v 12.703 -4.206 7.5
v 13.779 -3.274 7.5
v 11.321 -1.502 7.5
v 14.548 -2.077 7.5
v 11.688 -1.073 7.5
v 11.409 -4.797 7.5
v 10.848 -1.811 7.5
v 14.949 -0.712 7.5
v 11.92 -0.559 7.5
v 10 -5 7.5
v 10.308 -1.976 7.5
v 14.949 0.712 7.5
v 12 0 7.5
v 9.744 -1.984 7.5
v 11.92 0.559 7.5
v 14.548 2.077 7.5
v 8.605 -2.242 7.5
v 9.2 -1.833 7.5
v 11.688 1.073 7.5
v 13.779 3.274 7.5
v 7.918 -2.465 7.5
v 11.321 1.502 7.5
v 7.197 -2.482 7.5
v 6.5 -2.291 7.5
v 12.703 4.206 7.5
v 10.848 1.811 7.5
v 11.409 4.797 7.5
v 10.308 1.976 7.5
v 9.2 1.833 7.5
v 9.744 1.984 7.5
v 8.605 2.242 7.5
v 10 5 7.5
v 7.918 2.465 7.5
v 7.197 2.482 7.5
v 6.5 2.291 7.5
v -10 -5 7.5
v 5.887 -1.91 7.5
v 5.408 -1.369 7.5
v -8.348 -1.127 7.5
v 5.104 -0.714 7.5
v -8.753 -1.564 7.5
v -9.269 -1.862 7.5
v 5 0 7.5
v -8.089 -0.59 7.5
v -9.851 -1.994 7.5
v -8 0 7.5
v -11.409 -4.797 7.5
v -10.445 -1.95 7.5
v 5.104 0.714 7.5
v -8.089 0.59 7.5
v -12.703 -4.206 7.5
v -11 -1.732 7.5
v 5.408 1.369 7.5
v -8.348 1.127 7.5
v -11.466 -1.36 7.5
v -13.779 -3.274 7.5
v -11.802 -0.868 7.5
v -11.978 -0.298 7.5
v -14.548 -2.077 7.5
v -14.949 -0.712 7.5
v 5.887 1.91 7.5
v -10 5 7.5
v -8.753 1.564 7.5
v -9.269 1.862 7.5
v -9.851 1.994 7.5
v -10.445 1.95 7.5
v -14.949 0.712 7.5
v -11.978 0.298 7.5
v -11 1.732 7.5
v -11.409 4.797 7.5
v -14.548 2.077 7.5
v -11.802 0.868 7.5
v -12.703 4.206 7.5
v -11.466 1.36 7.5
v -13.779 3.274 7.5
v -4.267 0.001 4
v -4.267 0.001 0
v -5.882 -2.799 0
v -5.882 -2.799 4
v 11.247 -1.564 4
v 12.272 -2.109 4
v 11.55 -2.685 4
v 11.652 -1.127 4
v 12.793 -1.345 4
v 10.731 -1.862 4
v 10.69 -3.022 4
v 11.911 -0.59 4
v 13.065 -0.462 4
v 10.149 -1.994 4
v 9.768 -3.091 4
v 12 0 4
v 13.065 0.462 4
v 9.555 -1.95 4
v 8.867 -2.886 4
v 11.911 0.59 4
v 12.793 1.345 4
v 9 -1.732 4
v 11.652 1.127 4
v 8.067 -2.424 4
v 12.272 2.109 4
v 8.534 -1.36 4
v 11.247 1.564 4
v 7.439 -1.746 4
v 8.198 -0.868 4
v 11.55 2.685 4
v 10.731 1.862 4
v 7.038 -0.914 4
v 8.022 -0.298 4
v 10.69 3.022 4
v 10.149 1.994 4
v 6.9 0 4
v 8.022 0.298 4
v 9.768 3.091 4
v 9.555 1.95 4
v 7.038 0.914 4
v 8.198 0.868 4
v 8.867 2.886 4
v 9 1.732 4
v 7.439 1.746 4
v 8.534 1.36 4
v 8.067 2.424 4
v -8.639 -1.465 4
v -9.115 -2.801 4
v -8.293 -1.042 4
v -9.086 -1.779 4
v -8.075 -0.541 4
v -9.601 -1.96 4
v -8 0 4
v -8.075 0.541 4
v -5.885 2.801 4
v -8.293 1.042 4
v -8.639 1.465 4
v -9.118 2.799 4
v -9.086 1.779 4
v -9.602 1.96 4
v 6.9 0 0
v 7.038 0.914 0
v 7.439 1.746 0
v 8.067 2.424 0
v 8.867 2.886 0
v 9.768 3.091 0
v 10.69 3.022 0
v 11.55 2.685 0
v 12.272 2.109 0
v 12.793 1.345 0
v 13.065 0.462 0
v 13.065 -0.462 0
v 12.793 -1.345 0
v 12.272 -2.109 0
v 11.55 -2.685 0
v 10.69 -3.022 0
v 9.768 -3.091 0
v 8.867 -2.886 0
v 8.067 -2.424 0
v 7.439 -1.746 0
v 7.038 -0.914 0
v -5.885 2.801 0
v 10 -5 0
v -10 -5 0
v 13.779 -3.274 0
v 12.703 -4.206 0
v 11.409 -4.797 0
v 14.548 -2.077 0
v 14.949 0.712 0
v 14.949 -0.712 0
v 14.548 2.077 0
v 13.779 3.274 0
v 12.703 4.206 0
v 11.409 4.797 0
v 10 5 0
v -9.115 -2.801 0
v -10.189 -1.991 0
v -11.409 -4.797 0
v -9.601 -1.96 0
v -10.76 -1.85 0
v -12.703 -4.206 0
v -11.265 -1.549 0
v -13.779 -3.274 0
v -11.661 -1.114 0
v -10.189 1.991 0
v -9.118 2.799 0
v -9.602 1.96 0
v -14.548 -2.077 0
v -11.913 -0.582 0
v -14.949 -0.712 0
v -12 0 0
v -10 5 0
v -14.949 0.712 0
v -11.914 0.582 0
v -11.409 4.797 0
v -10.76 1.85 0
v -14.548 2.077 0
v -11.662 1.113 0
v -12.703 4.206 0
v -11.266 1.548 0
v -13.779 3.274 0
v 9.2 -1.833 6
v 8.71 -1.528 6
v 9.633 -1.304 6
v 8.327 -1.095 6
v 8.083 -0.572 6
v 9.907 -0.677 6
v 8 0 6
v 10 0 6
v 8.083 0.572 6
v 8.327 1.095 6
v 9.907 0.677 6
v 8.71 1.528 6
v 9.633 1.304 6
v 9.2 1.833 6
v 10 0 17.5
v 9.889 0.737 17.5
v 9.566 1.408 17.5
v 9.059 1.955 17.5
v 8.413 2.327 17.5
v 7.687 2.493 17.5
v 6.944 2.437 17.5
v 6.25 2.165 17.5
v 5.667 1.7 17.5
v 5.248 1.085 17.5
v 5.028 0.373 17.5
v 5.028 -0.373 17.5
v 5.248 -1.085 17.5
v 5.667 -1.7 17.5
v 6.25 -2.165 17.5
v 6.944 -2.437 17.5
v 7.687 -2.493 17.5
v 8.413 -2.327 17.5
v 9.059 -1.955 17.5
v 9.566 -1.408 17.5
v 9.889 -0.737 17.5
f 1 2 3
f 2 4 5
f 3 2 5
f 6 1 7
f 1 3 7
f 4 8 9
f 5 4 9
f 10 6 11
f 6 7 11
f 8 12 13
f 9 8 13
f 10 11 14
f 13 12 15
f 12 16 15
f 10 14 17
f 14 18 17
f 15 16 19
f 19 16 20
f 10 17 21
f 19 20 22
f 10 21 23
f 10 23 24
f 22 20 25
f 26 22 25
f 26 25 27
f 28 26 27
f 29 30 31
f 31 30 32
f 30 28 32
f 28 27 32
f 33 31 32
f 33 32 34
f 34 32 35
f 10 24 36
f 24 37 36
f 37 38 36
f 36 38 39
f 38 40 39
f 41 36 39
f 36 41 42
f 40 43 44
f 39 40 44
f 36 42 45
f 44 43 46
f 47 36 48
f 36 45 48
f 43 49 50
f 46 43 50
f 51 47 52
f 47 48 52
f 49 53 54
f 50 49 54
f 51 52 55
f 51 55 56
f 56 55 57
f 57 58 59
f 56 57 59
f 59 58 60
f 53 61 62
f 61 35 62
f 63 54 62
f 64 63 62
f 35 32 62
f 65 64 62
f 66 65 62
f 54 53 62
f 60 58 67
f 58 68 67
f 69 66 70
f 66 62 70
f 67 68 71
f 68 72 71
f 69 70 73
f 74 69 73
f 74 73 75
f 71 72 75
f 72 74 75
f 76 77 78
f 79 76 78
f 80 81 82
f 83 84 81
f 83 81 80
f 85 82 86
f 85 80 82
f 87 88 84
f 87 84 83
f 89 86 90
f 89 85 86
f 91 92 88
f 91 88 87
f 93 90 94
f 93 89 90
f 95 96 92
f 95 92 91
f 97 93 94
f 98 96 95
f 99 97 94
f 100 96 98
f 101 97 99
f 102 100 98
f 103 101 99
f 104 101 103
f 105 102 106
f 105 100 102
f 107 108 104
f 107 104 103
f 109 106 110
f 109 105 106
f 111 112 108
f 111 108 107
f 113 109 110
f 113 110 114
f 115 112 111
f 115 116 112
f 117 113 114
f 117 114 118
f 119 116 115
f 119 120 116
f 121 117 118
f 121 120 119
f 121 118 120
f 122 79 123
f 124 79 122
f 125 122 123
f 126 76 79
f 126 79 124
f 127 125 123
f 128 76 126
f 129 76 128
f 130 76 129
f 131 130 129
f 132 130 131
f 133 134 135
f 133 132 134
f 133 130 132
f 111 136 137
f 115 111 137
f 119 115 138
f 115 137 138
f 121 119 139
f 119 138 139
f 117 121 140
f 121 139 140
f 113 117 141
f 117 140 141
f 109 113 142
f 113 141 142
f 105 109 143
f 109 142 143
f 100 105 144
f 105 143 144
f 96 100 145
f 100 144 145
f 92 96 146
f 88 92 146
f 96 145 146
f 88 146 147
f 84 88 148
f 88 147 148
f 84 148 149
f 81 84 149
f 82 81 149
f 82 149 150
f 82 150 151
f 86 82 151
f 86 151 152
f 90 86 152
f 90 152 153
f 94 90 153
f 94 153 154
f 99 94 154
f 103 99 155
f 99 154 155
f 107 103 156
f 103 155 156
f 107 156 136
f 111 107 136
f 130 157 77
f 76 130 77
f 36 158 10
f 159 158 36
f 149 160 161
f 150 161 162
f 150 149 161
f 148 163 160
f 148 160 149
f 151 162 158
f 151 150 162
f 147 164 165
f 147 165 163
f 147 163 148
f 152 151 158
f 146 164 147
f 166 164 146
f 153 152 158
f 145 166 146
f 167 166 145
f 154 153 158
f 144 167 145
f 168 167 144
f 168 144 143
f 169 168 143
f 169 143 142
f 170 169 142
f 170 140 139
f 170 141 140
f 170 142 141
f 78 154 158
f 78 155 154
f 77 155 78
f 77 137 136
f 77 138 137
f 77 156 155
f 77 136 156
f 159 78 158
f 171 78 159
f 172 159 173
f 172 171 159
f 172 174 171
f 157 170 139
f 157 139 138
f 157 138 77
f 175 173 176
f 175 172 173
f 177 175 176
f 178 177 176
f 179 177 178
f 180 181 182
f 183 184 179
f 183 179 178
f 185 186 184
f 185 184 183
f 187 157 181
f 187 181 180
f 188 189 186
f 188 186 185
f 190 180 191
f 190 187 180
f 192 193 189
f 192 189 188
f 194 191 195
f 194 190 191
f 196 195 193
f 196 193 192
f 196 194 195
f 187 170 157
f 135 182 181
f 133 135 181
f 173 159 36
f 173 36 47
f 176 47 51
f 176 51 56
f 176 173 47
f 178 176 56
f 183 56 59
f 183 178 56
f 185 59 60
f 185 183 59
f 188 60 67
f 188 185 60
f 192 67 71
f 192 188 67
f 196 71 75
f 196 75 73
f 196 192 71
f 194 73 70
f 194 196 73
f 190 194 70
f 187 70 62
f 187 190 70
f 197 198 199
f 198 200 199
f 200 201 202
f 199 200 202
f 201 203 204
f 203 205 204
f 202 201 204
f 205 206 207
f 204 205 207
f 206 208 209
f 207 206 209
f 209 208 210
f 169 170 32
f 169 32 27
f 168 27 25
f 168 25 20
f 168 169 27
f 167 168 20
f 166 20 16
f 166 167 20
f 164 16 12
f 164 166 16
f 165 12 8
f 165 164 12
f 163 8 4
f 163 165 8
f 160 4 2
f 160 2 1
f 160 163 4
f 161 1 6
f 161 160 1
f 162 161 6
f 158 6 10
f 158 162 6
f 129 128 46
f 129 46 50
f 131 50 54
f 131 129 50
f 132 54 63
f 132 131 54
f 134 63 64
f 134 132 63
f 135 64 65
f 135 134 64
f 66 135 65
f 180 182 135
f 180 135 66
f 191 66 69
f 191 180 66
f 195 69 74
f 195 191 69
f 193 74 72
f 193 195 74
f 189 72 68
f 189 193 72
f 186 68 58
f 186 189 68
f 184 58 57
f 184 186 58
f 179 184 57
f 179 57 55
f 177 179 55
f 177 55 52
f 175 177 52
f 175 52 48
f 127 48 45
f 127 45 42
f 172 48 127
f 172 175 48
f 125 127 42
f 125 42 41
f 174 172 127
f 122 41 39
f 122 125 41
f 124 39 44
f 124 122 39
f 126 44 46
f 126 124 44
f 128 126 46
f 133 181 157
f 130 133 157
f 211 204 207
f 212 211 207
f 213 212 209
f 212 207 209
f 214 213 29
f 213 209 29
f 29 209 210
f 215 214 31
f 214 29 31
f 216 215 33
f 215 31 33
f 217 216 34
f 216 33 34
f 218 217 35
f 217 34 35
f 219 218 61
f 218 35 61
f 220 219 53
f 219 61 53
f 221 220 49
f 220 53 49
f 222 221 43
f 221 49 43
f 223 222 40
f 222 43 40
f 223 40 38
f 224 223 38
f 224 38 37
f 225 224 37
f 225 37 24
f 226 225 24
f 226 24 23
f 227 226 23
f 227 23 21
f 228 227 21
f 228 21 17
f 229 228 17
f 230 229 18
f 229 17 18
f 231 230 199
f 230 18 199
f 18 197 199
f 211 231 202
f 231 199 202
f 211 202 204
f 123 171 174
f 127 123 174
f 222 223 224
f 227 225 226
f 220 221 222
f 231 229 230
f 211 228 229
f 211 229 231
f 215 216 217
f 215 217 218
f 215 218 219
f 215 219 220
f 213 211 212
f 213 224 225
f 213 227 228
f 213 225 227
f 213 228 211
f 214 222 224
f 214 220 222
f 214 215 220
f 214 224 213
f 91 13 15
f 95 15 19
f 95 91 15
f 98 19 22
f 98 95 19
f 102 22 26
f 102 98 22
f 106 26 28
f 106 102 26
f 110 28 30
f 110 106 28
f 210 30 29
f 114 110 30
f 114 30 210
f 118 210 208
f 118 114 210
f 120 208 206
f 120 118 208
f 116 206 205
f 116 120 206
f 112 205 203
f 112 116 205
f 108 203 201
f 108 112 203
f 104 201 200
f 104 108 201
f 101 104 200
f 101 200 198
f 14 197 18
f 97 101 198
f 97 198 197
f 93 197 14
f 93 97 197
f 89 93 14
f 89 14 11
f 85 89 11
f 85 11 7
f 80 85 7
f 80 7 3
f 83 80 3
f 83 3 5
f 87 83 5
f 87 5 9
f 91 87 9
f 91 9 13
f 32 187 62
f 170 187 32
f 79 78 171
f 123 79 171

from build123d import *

# Parameters (mm, degrees)
SKETCH_1_R           = 2
EXTRUDE_1_DEPTH      = 7.5
EXTRUDE_2_DEPTH      = 10
EXTRUDE_2_DEPTH_BACK = 1.5
SKETCH_2_R           = 2.5
SKETCH_5_R           = 3.1
CUT_EXTRUDE_1_DEPTH  = 4


with BuildPart() as part:
    # 草圖1 → 填料-伸長1 (new body)
    with BuildSketch(Plane.XY):
        with BuildLine():
            Line((-10, 5), (10, 5))
            ThreePointArc((10, 5), (15, 0), (10, -5))
            Line((10, -5), (-10, -5))
            ThreePointArc((-10, -5), (-15, 0), (-10, 5))
        make_face()
        with Locations((-10, 0)):
            Circle(SKETCH_1_R, mode=Mode.SUBTRACT)
        with Locations((10, 0)):
            Circle(SKETCH_1_R, mode=Mode.SUBTRACT)
    extrude(amount=EXTRUDE_1_DEPTH)

    # 草圖2 → 填料-伸長2 (add, two sides: drawn at the far end of the back side and taken through both)
    with BuildSketch(Plane.XY.offset(7.5).offset(-EXTRUDE_2_DEPTH_BACK)):
        with Locations((7.5, 0)):
            Circle(SKETCH_2_R)
    extrude(amount=EXTRUDE_2_DEPTH + EXTRUDE_2_DEPTH_BACK)

    # 草圖5 → 除料-伸長1 (cut)
    with BuildSketch(Plane(origin=(0, 0, 0), x_dir=(-1, 0, 0), z_dir=(0, 0, -1))):
        with Locations((-10, 0)):
            Circle(SKETCH_5_R)
        Polygon((5.882234711, -2.799315774), (9.115395929, -2.800683725), (10.733161218, -0.001367951), (9.117765289, 2.799315774), (5.884604071, 2.800683725), (4.266838782, 0.001367951), align=None)
    extrude(amount=-CUT_EXTRUDE_1_DEPTH, mode=Mode.SUBTRACT)


solid = part.part
